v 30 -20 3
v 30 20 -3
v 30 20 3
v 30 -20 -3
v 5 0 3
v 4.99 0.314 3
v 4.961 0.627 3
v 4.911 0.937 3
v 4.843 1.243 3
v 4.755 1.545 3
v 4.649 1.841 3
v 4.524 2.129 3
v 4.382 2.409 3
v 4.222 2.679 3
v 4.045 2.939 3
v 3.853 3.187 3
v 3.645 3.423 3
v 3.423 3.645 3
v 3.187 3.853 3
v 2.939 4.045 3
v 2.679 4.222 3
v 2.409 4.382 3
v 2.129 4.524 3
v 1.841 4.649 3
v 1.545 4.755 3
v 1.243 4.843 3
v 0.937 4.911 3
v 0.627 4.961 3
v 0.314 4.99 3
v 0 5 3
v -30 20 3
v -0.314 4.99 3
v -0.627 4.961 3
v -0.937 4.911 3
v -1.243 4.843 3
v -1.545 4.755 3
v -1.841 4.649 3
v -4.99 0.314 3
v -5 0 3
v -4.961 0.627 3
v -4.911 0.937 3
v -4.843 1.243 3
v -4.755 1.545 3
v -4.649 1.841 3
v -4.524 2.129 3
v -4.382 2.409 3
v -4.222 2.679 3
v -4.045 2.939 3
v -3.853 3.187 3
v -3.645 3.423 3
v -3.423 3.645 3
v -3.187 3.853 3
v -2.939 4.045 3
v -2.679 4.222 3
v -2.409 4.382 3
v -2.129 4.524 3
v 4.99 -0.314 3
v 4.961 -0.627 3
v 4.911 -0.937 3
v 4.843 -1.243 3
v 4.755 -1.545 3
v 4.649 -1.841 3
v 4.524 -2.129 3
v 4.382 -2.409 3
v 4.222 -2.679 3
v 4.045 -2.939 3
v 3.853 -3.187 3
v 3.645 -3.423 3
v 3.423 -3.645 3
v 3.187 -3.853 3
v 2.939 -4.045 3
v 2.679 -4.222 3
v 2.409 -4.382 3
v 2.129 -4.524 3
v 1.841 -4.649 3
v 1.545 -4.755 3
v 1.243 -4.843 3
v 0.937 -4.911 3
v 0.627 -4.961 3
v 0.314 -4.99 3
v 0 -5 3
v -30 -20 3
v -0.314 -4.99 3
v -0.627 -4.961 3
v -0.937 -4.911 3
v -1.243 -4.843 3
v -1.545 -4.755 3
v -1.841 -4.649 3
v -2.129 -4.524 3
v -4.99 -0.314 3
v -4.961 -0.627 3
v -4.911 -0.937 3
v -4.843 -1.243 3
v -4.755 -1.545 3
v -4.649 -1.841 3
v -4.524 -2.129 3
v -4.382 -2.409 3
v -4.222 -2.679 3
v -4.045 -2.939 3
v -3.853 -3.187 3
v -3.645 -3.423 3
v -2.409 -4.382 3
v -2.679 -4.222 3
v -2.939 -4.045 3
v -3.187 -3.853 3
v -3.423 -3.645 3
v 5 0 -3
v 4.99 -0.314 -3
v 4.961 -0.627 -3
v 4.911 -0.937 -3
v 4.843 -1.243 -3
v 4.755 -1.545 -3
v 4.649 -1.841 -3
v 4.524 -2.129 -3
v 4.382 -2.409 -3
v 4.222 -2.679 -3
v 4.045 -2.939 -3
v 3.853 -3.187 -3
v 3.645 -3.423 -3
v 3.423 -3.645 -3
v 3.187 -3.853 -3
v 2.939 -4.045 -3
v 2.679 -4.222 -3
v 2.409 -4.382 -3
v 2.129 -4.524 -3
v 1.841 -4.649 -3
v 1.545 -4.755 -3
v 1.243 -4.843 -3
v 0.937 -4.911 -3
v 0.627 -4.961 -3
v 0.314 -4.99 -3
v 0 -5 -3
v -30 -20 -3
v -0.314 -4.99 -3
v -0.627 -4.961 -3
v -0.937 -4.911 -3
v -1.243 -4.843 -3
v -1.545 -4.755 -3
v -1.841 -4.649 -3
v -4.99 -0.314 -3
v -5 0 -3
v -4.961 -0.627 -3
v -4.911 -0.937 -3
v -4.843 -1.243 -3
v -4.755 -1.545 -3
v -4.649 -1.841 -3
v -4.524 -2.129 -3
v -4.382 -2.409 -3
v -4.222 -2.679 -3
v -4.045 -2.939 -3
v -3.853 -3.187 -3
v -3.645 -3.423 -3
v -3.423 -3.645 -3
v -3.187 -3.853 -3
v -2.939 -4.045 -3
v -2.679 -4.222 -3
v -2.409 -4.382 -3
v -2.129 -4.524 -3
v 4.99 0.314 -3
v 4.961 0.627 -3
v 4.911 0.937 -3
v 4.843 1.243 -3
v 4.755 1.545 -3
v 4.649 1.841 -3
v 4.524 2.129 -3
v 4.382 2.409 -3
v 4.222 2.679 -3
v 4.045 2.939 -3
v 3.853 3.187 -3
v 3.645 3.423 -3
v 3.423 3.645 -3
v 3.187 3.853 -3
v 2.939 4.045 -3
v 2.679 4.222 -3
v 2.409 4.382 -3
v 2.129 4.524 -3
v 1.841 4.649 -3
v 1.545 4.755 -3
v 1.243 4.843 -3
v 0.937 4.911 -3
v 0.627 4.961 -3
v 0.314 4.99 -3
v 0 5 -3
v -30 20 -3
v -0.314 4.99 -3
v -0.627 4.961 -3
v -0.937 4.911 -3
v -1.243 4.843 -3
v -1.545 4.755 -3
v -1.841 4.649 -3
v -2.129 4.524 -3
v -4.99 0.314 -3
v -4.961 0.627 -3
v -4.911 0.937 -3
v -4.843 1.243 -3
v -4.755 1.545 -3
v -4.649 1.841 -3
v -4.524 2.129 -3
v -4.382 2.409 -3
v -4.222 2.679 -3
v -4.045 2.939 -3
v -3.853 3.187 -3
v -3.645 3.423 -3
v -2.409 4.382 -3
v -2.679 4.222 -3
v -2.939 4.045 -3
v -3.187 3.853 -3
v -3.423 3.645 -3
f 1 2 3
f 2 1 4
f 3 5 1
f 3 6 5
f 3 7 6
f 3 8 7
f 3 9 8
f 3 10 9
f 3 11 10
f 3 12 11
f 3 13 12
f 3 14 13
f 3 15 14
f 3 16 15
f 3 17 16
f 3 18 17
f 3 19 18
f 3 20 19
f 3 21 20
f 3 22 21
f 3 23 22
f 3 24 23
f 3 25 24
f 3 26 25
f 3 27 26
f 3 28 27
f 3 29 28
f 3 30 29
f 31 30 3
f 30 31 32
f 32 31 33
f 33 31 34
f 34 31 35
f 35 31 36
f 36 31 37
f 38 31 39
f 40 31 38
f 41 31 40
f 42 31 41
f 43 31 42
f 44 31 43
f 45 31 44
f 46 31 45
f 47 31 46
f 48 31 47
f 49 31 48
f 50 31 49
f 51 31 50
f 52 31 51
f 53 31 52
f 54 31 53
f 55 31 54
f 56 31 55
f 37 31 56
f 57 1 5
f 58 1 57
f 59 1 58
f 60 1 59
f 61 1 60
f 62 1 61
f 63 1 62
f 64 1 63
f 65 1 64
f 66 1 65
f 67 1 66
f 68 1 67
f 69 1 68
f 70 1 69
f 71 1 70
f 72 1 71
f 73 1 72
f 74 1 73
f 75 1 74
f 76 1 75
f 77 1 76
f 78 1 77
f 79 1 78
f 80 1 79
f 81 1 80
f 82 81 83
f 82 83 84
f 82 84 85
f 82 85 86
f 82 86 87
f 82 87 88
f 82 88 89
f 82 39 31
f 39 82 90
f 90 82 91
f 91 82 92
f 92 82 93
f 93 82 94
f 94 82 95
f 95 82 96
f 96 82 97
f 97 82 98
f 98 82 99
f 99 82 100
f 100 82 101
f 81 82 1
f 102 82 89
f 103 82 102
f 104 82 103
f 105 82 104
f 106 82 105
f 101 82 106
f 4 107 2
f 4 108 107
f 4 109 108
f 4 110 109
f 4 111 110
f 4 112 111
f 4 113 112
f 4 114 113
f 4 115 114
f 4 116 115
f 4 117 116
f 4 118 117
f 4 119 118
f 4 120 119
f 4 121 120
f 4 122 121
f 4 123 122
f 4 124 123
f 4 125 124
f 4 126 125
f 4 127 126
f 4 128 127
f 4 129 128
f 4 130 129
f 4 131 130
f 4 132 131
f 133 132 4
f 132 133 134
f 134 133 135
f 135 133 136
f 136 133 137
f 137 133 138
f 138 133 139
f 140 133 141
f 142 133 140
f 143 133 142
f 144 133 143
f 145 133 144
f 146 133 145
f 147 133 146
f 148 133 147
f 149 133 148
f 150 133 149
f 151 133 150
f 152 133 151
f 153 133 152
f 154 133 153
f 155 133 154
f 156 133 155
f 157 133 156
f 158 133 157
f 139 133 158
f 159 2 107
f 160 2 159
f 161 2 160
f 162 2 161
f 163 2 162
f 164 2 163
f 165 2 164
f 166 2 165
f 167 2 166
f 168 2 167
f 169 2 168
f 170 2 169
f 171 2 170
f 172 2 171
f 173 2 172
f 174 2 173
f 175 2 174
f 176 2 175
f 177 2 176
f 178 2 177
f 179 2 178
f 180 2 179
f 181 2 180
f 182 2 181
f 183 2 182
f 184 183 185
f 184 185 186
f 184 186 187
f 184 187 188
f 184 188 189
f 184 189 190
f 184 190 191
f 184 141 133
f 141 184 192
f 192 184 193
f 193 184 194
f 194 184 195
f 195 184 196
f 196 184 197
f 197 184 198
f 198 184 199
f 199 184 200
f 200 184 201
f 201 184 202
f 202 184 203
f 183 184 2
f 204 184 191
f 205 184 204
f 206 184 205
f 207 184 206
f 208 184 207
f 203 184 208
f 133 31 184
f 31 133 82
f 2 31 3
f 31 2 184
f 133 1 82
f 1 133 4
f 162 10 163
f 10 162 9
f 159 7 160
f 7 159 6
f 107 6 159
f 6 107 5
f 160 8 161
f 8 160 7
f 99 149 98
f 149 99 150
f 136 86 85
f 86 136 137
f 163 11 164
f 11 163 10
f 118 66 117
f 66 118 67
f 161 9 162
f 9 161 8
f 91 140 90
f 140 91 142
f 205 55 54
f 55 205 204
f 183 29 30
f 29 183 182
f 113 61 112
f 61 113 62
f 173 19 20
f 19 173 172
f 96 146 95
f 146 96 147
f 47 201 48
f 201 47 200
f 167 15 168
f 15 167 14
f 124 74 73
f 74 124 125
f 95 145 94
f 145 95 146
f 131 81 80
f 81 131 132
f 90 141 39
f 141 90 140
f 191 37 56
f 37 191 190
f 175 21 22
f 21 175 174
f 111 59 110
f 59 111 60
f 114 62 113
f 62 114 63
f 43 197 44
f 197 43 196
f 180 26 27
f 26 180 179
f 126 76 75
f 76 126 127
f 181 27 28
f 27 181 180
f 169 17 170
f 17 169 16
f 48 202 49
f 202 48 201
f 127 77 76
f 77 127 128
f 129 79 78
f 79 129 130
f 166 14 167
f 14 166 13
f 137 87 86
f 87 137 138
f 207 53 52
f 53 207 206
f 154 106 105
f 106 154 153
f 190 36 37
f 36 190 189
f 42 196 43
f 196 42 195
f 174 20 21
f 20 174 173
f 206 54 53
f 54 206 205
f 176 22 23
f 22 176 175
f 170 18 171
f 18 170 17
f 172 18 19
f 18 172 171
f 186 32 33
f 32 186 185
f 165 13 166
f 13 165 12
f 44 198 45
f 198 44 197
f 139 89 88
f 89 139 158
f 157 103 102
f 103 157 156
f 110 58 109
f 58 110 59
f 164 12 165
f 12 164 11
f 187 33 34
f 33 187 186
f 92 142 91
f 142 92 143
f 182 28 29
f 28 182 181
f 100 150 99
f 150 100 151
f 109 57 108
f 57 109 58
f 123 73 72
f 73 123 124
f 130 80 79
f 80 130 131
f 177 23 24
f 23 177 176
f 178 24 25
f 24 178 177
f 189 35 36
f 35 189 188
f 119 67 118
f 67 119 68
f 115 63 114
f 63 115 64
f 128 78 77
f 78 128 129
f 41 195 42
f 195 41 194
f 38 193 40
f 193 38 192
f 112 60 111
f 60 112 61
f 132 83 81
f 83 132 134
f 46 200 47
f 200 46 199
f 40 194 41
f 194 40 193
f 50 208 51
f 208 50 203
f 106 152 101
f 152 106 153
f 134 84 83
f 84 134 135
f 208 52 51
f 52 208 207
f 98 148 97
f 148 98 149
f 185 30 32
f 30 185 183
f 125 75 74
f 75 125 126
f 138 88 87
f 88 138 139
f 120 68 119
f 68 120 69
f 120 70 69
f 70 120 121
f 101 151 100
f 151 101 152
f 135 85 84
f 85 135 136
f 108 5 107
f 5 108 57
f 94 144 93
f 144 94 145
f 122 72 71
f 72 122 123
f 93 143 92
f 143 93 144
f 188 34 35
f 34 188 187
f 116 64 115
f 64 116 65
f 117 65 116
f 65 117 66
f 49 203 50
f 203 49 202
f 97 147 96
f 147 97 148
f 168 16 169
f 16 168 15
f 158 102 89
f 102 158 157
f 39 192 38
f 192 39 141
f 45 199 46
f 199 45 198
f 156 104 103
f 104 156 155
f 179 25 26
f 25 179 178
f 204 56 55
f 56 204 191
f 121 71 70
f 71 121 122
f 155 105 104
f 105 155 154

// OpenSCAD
difference() {
    cube([60, 40, 6], center=true);
    cylinder(r=5, h=10, center=true, $fn=100);
}
